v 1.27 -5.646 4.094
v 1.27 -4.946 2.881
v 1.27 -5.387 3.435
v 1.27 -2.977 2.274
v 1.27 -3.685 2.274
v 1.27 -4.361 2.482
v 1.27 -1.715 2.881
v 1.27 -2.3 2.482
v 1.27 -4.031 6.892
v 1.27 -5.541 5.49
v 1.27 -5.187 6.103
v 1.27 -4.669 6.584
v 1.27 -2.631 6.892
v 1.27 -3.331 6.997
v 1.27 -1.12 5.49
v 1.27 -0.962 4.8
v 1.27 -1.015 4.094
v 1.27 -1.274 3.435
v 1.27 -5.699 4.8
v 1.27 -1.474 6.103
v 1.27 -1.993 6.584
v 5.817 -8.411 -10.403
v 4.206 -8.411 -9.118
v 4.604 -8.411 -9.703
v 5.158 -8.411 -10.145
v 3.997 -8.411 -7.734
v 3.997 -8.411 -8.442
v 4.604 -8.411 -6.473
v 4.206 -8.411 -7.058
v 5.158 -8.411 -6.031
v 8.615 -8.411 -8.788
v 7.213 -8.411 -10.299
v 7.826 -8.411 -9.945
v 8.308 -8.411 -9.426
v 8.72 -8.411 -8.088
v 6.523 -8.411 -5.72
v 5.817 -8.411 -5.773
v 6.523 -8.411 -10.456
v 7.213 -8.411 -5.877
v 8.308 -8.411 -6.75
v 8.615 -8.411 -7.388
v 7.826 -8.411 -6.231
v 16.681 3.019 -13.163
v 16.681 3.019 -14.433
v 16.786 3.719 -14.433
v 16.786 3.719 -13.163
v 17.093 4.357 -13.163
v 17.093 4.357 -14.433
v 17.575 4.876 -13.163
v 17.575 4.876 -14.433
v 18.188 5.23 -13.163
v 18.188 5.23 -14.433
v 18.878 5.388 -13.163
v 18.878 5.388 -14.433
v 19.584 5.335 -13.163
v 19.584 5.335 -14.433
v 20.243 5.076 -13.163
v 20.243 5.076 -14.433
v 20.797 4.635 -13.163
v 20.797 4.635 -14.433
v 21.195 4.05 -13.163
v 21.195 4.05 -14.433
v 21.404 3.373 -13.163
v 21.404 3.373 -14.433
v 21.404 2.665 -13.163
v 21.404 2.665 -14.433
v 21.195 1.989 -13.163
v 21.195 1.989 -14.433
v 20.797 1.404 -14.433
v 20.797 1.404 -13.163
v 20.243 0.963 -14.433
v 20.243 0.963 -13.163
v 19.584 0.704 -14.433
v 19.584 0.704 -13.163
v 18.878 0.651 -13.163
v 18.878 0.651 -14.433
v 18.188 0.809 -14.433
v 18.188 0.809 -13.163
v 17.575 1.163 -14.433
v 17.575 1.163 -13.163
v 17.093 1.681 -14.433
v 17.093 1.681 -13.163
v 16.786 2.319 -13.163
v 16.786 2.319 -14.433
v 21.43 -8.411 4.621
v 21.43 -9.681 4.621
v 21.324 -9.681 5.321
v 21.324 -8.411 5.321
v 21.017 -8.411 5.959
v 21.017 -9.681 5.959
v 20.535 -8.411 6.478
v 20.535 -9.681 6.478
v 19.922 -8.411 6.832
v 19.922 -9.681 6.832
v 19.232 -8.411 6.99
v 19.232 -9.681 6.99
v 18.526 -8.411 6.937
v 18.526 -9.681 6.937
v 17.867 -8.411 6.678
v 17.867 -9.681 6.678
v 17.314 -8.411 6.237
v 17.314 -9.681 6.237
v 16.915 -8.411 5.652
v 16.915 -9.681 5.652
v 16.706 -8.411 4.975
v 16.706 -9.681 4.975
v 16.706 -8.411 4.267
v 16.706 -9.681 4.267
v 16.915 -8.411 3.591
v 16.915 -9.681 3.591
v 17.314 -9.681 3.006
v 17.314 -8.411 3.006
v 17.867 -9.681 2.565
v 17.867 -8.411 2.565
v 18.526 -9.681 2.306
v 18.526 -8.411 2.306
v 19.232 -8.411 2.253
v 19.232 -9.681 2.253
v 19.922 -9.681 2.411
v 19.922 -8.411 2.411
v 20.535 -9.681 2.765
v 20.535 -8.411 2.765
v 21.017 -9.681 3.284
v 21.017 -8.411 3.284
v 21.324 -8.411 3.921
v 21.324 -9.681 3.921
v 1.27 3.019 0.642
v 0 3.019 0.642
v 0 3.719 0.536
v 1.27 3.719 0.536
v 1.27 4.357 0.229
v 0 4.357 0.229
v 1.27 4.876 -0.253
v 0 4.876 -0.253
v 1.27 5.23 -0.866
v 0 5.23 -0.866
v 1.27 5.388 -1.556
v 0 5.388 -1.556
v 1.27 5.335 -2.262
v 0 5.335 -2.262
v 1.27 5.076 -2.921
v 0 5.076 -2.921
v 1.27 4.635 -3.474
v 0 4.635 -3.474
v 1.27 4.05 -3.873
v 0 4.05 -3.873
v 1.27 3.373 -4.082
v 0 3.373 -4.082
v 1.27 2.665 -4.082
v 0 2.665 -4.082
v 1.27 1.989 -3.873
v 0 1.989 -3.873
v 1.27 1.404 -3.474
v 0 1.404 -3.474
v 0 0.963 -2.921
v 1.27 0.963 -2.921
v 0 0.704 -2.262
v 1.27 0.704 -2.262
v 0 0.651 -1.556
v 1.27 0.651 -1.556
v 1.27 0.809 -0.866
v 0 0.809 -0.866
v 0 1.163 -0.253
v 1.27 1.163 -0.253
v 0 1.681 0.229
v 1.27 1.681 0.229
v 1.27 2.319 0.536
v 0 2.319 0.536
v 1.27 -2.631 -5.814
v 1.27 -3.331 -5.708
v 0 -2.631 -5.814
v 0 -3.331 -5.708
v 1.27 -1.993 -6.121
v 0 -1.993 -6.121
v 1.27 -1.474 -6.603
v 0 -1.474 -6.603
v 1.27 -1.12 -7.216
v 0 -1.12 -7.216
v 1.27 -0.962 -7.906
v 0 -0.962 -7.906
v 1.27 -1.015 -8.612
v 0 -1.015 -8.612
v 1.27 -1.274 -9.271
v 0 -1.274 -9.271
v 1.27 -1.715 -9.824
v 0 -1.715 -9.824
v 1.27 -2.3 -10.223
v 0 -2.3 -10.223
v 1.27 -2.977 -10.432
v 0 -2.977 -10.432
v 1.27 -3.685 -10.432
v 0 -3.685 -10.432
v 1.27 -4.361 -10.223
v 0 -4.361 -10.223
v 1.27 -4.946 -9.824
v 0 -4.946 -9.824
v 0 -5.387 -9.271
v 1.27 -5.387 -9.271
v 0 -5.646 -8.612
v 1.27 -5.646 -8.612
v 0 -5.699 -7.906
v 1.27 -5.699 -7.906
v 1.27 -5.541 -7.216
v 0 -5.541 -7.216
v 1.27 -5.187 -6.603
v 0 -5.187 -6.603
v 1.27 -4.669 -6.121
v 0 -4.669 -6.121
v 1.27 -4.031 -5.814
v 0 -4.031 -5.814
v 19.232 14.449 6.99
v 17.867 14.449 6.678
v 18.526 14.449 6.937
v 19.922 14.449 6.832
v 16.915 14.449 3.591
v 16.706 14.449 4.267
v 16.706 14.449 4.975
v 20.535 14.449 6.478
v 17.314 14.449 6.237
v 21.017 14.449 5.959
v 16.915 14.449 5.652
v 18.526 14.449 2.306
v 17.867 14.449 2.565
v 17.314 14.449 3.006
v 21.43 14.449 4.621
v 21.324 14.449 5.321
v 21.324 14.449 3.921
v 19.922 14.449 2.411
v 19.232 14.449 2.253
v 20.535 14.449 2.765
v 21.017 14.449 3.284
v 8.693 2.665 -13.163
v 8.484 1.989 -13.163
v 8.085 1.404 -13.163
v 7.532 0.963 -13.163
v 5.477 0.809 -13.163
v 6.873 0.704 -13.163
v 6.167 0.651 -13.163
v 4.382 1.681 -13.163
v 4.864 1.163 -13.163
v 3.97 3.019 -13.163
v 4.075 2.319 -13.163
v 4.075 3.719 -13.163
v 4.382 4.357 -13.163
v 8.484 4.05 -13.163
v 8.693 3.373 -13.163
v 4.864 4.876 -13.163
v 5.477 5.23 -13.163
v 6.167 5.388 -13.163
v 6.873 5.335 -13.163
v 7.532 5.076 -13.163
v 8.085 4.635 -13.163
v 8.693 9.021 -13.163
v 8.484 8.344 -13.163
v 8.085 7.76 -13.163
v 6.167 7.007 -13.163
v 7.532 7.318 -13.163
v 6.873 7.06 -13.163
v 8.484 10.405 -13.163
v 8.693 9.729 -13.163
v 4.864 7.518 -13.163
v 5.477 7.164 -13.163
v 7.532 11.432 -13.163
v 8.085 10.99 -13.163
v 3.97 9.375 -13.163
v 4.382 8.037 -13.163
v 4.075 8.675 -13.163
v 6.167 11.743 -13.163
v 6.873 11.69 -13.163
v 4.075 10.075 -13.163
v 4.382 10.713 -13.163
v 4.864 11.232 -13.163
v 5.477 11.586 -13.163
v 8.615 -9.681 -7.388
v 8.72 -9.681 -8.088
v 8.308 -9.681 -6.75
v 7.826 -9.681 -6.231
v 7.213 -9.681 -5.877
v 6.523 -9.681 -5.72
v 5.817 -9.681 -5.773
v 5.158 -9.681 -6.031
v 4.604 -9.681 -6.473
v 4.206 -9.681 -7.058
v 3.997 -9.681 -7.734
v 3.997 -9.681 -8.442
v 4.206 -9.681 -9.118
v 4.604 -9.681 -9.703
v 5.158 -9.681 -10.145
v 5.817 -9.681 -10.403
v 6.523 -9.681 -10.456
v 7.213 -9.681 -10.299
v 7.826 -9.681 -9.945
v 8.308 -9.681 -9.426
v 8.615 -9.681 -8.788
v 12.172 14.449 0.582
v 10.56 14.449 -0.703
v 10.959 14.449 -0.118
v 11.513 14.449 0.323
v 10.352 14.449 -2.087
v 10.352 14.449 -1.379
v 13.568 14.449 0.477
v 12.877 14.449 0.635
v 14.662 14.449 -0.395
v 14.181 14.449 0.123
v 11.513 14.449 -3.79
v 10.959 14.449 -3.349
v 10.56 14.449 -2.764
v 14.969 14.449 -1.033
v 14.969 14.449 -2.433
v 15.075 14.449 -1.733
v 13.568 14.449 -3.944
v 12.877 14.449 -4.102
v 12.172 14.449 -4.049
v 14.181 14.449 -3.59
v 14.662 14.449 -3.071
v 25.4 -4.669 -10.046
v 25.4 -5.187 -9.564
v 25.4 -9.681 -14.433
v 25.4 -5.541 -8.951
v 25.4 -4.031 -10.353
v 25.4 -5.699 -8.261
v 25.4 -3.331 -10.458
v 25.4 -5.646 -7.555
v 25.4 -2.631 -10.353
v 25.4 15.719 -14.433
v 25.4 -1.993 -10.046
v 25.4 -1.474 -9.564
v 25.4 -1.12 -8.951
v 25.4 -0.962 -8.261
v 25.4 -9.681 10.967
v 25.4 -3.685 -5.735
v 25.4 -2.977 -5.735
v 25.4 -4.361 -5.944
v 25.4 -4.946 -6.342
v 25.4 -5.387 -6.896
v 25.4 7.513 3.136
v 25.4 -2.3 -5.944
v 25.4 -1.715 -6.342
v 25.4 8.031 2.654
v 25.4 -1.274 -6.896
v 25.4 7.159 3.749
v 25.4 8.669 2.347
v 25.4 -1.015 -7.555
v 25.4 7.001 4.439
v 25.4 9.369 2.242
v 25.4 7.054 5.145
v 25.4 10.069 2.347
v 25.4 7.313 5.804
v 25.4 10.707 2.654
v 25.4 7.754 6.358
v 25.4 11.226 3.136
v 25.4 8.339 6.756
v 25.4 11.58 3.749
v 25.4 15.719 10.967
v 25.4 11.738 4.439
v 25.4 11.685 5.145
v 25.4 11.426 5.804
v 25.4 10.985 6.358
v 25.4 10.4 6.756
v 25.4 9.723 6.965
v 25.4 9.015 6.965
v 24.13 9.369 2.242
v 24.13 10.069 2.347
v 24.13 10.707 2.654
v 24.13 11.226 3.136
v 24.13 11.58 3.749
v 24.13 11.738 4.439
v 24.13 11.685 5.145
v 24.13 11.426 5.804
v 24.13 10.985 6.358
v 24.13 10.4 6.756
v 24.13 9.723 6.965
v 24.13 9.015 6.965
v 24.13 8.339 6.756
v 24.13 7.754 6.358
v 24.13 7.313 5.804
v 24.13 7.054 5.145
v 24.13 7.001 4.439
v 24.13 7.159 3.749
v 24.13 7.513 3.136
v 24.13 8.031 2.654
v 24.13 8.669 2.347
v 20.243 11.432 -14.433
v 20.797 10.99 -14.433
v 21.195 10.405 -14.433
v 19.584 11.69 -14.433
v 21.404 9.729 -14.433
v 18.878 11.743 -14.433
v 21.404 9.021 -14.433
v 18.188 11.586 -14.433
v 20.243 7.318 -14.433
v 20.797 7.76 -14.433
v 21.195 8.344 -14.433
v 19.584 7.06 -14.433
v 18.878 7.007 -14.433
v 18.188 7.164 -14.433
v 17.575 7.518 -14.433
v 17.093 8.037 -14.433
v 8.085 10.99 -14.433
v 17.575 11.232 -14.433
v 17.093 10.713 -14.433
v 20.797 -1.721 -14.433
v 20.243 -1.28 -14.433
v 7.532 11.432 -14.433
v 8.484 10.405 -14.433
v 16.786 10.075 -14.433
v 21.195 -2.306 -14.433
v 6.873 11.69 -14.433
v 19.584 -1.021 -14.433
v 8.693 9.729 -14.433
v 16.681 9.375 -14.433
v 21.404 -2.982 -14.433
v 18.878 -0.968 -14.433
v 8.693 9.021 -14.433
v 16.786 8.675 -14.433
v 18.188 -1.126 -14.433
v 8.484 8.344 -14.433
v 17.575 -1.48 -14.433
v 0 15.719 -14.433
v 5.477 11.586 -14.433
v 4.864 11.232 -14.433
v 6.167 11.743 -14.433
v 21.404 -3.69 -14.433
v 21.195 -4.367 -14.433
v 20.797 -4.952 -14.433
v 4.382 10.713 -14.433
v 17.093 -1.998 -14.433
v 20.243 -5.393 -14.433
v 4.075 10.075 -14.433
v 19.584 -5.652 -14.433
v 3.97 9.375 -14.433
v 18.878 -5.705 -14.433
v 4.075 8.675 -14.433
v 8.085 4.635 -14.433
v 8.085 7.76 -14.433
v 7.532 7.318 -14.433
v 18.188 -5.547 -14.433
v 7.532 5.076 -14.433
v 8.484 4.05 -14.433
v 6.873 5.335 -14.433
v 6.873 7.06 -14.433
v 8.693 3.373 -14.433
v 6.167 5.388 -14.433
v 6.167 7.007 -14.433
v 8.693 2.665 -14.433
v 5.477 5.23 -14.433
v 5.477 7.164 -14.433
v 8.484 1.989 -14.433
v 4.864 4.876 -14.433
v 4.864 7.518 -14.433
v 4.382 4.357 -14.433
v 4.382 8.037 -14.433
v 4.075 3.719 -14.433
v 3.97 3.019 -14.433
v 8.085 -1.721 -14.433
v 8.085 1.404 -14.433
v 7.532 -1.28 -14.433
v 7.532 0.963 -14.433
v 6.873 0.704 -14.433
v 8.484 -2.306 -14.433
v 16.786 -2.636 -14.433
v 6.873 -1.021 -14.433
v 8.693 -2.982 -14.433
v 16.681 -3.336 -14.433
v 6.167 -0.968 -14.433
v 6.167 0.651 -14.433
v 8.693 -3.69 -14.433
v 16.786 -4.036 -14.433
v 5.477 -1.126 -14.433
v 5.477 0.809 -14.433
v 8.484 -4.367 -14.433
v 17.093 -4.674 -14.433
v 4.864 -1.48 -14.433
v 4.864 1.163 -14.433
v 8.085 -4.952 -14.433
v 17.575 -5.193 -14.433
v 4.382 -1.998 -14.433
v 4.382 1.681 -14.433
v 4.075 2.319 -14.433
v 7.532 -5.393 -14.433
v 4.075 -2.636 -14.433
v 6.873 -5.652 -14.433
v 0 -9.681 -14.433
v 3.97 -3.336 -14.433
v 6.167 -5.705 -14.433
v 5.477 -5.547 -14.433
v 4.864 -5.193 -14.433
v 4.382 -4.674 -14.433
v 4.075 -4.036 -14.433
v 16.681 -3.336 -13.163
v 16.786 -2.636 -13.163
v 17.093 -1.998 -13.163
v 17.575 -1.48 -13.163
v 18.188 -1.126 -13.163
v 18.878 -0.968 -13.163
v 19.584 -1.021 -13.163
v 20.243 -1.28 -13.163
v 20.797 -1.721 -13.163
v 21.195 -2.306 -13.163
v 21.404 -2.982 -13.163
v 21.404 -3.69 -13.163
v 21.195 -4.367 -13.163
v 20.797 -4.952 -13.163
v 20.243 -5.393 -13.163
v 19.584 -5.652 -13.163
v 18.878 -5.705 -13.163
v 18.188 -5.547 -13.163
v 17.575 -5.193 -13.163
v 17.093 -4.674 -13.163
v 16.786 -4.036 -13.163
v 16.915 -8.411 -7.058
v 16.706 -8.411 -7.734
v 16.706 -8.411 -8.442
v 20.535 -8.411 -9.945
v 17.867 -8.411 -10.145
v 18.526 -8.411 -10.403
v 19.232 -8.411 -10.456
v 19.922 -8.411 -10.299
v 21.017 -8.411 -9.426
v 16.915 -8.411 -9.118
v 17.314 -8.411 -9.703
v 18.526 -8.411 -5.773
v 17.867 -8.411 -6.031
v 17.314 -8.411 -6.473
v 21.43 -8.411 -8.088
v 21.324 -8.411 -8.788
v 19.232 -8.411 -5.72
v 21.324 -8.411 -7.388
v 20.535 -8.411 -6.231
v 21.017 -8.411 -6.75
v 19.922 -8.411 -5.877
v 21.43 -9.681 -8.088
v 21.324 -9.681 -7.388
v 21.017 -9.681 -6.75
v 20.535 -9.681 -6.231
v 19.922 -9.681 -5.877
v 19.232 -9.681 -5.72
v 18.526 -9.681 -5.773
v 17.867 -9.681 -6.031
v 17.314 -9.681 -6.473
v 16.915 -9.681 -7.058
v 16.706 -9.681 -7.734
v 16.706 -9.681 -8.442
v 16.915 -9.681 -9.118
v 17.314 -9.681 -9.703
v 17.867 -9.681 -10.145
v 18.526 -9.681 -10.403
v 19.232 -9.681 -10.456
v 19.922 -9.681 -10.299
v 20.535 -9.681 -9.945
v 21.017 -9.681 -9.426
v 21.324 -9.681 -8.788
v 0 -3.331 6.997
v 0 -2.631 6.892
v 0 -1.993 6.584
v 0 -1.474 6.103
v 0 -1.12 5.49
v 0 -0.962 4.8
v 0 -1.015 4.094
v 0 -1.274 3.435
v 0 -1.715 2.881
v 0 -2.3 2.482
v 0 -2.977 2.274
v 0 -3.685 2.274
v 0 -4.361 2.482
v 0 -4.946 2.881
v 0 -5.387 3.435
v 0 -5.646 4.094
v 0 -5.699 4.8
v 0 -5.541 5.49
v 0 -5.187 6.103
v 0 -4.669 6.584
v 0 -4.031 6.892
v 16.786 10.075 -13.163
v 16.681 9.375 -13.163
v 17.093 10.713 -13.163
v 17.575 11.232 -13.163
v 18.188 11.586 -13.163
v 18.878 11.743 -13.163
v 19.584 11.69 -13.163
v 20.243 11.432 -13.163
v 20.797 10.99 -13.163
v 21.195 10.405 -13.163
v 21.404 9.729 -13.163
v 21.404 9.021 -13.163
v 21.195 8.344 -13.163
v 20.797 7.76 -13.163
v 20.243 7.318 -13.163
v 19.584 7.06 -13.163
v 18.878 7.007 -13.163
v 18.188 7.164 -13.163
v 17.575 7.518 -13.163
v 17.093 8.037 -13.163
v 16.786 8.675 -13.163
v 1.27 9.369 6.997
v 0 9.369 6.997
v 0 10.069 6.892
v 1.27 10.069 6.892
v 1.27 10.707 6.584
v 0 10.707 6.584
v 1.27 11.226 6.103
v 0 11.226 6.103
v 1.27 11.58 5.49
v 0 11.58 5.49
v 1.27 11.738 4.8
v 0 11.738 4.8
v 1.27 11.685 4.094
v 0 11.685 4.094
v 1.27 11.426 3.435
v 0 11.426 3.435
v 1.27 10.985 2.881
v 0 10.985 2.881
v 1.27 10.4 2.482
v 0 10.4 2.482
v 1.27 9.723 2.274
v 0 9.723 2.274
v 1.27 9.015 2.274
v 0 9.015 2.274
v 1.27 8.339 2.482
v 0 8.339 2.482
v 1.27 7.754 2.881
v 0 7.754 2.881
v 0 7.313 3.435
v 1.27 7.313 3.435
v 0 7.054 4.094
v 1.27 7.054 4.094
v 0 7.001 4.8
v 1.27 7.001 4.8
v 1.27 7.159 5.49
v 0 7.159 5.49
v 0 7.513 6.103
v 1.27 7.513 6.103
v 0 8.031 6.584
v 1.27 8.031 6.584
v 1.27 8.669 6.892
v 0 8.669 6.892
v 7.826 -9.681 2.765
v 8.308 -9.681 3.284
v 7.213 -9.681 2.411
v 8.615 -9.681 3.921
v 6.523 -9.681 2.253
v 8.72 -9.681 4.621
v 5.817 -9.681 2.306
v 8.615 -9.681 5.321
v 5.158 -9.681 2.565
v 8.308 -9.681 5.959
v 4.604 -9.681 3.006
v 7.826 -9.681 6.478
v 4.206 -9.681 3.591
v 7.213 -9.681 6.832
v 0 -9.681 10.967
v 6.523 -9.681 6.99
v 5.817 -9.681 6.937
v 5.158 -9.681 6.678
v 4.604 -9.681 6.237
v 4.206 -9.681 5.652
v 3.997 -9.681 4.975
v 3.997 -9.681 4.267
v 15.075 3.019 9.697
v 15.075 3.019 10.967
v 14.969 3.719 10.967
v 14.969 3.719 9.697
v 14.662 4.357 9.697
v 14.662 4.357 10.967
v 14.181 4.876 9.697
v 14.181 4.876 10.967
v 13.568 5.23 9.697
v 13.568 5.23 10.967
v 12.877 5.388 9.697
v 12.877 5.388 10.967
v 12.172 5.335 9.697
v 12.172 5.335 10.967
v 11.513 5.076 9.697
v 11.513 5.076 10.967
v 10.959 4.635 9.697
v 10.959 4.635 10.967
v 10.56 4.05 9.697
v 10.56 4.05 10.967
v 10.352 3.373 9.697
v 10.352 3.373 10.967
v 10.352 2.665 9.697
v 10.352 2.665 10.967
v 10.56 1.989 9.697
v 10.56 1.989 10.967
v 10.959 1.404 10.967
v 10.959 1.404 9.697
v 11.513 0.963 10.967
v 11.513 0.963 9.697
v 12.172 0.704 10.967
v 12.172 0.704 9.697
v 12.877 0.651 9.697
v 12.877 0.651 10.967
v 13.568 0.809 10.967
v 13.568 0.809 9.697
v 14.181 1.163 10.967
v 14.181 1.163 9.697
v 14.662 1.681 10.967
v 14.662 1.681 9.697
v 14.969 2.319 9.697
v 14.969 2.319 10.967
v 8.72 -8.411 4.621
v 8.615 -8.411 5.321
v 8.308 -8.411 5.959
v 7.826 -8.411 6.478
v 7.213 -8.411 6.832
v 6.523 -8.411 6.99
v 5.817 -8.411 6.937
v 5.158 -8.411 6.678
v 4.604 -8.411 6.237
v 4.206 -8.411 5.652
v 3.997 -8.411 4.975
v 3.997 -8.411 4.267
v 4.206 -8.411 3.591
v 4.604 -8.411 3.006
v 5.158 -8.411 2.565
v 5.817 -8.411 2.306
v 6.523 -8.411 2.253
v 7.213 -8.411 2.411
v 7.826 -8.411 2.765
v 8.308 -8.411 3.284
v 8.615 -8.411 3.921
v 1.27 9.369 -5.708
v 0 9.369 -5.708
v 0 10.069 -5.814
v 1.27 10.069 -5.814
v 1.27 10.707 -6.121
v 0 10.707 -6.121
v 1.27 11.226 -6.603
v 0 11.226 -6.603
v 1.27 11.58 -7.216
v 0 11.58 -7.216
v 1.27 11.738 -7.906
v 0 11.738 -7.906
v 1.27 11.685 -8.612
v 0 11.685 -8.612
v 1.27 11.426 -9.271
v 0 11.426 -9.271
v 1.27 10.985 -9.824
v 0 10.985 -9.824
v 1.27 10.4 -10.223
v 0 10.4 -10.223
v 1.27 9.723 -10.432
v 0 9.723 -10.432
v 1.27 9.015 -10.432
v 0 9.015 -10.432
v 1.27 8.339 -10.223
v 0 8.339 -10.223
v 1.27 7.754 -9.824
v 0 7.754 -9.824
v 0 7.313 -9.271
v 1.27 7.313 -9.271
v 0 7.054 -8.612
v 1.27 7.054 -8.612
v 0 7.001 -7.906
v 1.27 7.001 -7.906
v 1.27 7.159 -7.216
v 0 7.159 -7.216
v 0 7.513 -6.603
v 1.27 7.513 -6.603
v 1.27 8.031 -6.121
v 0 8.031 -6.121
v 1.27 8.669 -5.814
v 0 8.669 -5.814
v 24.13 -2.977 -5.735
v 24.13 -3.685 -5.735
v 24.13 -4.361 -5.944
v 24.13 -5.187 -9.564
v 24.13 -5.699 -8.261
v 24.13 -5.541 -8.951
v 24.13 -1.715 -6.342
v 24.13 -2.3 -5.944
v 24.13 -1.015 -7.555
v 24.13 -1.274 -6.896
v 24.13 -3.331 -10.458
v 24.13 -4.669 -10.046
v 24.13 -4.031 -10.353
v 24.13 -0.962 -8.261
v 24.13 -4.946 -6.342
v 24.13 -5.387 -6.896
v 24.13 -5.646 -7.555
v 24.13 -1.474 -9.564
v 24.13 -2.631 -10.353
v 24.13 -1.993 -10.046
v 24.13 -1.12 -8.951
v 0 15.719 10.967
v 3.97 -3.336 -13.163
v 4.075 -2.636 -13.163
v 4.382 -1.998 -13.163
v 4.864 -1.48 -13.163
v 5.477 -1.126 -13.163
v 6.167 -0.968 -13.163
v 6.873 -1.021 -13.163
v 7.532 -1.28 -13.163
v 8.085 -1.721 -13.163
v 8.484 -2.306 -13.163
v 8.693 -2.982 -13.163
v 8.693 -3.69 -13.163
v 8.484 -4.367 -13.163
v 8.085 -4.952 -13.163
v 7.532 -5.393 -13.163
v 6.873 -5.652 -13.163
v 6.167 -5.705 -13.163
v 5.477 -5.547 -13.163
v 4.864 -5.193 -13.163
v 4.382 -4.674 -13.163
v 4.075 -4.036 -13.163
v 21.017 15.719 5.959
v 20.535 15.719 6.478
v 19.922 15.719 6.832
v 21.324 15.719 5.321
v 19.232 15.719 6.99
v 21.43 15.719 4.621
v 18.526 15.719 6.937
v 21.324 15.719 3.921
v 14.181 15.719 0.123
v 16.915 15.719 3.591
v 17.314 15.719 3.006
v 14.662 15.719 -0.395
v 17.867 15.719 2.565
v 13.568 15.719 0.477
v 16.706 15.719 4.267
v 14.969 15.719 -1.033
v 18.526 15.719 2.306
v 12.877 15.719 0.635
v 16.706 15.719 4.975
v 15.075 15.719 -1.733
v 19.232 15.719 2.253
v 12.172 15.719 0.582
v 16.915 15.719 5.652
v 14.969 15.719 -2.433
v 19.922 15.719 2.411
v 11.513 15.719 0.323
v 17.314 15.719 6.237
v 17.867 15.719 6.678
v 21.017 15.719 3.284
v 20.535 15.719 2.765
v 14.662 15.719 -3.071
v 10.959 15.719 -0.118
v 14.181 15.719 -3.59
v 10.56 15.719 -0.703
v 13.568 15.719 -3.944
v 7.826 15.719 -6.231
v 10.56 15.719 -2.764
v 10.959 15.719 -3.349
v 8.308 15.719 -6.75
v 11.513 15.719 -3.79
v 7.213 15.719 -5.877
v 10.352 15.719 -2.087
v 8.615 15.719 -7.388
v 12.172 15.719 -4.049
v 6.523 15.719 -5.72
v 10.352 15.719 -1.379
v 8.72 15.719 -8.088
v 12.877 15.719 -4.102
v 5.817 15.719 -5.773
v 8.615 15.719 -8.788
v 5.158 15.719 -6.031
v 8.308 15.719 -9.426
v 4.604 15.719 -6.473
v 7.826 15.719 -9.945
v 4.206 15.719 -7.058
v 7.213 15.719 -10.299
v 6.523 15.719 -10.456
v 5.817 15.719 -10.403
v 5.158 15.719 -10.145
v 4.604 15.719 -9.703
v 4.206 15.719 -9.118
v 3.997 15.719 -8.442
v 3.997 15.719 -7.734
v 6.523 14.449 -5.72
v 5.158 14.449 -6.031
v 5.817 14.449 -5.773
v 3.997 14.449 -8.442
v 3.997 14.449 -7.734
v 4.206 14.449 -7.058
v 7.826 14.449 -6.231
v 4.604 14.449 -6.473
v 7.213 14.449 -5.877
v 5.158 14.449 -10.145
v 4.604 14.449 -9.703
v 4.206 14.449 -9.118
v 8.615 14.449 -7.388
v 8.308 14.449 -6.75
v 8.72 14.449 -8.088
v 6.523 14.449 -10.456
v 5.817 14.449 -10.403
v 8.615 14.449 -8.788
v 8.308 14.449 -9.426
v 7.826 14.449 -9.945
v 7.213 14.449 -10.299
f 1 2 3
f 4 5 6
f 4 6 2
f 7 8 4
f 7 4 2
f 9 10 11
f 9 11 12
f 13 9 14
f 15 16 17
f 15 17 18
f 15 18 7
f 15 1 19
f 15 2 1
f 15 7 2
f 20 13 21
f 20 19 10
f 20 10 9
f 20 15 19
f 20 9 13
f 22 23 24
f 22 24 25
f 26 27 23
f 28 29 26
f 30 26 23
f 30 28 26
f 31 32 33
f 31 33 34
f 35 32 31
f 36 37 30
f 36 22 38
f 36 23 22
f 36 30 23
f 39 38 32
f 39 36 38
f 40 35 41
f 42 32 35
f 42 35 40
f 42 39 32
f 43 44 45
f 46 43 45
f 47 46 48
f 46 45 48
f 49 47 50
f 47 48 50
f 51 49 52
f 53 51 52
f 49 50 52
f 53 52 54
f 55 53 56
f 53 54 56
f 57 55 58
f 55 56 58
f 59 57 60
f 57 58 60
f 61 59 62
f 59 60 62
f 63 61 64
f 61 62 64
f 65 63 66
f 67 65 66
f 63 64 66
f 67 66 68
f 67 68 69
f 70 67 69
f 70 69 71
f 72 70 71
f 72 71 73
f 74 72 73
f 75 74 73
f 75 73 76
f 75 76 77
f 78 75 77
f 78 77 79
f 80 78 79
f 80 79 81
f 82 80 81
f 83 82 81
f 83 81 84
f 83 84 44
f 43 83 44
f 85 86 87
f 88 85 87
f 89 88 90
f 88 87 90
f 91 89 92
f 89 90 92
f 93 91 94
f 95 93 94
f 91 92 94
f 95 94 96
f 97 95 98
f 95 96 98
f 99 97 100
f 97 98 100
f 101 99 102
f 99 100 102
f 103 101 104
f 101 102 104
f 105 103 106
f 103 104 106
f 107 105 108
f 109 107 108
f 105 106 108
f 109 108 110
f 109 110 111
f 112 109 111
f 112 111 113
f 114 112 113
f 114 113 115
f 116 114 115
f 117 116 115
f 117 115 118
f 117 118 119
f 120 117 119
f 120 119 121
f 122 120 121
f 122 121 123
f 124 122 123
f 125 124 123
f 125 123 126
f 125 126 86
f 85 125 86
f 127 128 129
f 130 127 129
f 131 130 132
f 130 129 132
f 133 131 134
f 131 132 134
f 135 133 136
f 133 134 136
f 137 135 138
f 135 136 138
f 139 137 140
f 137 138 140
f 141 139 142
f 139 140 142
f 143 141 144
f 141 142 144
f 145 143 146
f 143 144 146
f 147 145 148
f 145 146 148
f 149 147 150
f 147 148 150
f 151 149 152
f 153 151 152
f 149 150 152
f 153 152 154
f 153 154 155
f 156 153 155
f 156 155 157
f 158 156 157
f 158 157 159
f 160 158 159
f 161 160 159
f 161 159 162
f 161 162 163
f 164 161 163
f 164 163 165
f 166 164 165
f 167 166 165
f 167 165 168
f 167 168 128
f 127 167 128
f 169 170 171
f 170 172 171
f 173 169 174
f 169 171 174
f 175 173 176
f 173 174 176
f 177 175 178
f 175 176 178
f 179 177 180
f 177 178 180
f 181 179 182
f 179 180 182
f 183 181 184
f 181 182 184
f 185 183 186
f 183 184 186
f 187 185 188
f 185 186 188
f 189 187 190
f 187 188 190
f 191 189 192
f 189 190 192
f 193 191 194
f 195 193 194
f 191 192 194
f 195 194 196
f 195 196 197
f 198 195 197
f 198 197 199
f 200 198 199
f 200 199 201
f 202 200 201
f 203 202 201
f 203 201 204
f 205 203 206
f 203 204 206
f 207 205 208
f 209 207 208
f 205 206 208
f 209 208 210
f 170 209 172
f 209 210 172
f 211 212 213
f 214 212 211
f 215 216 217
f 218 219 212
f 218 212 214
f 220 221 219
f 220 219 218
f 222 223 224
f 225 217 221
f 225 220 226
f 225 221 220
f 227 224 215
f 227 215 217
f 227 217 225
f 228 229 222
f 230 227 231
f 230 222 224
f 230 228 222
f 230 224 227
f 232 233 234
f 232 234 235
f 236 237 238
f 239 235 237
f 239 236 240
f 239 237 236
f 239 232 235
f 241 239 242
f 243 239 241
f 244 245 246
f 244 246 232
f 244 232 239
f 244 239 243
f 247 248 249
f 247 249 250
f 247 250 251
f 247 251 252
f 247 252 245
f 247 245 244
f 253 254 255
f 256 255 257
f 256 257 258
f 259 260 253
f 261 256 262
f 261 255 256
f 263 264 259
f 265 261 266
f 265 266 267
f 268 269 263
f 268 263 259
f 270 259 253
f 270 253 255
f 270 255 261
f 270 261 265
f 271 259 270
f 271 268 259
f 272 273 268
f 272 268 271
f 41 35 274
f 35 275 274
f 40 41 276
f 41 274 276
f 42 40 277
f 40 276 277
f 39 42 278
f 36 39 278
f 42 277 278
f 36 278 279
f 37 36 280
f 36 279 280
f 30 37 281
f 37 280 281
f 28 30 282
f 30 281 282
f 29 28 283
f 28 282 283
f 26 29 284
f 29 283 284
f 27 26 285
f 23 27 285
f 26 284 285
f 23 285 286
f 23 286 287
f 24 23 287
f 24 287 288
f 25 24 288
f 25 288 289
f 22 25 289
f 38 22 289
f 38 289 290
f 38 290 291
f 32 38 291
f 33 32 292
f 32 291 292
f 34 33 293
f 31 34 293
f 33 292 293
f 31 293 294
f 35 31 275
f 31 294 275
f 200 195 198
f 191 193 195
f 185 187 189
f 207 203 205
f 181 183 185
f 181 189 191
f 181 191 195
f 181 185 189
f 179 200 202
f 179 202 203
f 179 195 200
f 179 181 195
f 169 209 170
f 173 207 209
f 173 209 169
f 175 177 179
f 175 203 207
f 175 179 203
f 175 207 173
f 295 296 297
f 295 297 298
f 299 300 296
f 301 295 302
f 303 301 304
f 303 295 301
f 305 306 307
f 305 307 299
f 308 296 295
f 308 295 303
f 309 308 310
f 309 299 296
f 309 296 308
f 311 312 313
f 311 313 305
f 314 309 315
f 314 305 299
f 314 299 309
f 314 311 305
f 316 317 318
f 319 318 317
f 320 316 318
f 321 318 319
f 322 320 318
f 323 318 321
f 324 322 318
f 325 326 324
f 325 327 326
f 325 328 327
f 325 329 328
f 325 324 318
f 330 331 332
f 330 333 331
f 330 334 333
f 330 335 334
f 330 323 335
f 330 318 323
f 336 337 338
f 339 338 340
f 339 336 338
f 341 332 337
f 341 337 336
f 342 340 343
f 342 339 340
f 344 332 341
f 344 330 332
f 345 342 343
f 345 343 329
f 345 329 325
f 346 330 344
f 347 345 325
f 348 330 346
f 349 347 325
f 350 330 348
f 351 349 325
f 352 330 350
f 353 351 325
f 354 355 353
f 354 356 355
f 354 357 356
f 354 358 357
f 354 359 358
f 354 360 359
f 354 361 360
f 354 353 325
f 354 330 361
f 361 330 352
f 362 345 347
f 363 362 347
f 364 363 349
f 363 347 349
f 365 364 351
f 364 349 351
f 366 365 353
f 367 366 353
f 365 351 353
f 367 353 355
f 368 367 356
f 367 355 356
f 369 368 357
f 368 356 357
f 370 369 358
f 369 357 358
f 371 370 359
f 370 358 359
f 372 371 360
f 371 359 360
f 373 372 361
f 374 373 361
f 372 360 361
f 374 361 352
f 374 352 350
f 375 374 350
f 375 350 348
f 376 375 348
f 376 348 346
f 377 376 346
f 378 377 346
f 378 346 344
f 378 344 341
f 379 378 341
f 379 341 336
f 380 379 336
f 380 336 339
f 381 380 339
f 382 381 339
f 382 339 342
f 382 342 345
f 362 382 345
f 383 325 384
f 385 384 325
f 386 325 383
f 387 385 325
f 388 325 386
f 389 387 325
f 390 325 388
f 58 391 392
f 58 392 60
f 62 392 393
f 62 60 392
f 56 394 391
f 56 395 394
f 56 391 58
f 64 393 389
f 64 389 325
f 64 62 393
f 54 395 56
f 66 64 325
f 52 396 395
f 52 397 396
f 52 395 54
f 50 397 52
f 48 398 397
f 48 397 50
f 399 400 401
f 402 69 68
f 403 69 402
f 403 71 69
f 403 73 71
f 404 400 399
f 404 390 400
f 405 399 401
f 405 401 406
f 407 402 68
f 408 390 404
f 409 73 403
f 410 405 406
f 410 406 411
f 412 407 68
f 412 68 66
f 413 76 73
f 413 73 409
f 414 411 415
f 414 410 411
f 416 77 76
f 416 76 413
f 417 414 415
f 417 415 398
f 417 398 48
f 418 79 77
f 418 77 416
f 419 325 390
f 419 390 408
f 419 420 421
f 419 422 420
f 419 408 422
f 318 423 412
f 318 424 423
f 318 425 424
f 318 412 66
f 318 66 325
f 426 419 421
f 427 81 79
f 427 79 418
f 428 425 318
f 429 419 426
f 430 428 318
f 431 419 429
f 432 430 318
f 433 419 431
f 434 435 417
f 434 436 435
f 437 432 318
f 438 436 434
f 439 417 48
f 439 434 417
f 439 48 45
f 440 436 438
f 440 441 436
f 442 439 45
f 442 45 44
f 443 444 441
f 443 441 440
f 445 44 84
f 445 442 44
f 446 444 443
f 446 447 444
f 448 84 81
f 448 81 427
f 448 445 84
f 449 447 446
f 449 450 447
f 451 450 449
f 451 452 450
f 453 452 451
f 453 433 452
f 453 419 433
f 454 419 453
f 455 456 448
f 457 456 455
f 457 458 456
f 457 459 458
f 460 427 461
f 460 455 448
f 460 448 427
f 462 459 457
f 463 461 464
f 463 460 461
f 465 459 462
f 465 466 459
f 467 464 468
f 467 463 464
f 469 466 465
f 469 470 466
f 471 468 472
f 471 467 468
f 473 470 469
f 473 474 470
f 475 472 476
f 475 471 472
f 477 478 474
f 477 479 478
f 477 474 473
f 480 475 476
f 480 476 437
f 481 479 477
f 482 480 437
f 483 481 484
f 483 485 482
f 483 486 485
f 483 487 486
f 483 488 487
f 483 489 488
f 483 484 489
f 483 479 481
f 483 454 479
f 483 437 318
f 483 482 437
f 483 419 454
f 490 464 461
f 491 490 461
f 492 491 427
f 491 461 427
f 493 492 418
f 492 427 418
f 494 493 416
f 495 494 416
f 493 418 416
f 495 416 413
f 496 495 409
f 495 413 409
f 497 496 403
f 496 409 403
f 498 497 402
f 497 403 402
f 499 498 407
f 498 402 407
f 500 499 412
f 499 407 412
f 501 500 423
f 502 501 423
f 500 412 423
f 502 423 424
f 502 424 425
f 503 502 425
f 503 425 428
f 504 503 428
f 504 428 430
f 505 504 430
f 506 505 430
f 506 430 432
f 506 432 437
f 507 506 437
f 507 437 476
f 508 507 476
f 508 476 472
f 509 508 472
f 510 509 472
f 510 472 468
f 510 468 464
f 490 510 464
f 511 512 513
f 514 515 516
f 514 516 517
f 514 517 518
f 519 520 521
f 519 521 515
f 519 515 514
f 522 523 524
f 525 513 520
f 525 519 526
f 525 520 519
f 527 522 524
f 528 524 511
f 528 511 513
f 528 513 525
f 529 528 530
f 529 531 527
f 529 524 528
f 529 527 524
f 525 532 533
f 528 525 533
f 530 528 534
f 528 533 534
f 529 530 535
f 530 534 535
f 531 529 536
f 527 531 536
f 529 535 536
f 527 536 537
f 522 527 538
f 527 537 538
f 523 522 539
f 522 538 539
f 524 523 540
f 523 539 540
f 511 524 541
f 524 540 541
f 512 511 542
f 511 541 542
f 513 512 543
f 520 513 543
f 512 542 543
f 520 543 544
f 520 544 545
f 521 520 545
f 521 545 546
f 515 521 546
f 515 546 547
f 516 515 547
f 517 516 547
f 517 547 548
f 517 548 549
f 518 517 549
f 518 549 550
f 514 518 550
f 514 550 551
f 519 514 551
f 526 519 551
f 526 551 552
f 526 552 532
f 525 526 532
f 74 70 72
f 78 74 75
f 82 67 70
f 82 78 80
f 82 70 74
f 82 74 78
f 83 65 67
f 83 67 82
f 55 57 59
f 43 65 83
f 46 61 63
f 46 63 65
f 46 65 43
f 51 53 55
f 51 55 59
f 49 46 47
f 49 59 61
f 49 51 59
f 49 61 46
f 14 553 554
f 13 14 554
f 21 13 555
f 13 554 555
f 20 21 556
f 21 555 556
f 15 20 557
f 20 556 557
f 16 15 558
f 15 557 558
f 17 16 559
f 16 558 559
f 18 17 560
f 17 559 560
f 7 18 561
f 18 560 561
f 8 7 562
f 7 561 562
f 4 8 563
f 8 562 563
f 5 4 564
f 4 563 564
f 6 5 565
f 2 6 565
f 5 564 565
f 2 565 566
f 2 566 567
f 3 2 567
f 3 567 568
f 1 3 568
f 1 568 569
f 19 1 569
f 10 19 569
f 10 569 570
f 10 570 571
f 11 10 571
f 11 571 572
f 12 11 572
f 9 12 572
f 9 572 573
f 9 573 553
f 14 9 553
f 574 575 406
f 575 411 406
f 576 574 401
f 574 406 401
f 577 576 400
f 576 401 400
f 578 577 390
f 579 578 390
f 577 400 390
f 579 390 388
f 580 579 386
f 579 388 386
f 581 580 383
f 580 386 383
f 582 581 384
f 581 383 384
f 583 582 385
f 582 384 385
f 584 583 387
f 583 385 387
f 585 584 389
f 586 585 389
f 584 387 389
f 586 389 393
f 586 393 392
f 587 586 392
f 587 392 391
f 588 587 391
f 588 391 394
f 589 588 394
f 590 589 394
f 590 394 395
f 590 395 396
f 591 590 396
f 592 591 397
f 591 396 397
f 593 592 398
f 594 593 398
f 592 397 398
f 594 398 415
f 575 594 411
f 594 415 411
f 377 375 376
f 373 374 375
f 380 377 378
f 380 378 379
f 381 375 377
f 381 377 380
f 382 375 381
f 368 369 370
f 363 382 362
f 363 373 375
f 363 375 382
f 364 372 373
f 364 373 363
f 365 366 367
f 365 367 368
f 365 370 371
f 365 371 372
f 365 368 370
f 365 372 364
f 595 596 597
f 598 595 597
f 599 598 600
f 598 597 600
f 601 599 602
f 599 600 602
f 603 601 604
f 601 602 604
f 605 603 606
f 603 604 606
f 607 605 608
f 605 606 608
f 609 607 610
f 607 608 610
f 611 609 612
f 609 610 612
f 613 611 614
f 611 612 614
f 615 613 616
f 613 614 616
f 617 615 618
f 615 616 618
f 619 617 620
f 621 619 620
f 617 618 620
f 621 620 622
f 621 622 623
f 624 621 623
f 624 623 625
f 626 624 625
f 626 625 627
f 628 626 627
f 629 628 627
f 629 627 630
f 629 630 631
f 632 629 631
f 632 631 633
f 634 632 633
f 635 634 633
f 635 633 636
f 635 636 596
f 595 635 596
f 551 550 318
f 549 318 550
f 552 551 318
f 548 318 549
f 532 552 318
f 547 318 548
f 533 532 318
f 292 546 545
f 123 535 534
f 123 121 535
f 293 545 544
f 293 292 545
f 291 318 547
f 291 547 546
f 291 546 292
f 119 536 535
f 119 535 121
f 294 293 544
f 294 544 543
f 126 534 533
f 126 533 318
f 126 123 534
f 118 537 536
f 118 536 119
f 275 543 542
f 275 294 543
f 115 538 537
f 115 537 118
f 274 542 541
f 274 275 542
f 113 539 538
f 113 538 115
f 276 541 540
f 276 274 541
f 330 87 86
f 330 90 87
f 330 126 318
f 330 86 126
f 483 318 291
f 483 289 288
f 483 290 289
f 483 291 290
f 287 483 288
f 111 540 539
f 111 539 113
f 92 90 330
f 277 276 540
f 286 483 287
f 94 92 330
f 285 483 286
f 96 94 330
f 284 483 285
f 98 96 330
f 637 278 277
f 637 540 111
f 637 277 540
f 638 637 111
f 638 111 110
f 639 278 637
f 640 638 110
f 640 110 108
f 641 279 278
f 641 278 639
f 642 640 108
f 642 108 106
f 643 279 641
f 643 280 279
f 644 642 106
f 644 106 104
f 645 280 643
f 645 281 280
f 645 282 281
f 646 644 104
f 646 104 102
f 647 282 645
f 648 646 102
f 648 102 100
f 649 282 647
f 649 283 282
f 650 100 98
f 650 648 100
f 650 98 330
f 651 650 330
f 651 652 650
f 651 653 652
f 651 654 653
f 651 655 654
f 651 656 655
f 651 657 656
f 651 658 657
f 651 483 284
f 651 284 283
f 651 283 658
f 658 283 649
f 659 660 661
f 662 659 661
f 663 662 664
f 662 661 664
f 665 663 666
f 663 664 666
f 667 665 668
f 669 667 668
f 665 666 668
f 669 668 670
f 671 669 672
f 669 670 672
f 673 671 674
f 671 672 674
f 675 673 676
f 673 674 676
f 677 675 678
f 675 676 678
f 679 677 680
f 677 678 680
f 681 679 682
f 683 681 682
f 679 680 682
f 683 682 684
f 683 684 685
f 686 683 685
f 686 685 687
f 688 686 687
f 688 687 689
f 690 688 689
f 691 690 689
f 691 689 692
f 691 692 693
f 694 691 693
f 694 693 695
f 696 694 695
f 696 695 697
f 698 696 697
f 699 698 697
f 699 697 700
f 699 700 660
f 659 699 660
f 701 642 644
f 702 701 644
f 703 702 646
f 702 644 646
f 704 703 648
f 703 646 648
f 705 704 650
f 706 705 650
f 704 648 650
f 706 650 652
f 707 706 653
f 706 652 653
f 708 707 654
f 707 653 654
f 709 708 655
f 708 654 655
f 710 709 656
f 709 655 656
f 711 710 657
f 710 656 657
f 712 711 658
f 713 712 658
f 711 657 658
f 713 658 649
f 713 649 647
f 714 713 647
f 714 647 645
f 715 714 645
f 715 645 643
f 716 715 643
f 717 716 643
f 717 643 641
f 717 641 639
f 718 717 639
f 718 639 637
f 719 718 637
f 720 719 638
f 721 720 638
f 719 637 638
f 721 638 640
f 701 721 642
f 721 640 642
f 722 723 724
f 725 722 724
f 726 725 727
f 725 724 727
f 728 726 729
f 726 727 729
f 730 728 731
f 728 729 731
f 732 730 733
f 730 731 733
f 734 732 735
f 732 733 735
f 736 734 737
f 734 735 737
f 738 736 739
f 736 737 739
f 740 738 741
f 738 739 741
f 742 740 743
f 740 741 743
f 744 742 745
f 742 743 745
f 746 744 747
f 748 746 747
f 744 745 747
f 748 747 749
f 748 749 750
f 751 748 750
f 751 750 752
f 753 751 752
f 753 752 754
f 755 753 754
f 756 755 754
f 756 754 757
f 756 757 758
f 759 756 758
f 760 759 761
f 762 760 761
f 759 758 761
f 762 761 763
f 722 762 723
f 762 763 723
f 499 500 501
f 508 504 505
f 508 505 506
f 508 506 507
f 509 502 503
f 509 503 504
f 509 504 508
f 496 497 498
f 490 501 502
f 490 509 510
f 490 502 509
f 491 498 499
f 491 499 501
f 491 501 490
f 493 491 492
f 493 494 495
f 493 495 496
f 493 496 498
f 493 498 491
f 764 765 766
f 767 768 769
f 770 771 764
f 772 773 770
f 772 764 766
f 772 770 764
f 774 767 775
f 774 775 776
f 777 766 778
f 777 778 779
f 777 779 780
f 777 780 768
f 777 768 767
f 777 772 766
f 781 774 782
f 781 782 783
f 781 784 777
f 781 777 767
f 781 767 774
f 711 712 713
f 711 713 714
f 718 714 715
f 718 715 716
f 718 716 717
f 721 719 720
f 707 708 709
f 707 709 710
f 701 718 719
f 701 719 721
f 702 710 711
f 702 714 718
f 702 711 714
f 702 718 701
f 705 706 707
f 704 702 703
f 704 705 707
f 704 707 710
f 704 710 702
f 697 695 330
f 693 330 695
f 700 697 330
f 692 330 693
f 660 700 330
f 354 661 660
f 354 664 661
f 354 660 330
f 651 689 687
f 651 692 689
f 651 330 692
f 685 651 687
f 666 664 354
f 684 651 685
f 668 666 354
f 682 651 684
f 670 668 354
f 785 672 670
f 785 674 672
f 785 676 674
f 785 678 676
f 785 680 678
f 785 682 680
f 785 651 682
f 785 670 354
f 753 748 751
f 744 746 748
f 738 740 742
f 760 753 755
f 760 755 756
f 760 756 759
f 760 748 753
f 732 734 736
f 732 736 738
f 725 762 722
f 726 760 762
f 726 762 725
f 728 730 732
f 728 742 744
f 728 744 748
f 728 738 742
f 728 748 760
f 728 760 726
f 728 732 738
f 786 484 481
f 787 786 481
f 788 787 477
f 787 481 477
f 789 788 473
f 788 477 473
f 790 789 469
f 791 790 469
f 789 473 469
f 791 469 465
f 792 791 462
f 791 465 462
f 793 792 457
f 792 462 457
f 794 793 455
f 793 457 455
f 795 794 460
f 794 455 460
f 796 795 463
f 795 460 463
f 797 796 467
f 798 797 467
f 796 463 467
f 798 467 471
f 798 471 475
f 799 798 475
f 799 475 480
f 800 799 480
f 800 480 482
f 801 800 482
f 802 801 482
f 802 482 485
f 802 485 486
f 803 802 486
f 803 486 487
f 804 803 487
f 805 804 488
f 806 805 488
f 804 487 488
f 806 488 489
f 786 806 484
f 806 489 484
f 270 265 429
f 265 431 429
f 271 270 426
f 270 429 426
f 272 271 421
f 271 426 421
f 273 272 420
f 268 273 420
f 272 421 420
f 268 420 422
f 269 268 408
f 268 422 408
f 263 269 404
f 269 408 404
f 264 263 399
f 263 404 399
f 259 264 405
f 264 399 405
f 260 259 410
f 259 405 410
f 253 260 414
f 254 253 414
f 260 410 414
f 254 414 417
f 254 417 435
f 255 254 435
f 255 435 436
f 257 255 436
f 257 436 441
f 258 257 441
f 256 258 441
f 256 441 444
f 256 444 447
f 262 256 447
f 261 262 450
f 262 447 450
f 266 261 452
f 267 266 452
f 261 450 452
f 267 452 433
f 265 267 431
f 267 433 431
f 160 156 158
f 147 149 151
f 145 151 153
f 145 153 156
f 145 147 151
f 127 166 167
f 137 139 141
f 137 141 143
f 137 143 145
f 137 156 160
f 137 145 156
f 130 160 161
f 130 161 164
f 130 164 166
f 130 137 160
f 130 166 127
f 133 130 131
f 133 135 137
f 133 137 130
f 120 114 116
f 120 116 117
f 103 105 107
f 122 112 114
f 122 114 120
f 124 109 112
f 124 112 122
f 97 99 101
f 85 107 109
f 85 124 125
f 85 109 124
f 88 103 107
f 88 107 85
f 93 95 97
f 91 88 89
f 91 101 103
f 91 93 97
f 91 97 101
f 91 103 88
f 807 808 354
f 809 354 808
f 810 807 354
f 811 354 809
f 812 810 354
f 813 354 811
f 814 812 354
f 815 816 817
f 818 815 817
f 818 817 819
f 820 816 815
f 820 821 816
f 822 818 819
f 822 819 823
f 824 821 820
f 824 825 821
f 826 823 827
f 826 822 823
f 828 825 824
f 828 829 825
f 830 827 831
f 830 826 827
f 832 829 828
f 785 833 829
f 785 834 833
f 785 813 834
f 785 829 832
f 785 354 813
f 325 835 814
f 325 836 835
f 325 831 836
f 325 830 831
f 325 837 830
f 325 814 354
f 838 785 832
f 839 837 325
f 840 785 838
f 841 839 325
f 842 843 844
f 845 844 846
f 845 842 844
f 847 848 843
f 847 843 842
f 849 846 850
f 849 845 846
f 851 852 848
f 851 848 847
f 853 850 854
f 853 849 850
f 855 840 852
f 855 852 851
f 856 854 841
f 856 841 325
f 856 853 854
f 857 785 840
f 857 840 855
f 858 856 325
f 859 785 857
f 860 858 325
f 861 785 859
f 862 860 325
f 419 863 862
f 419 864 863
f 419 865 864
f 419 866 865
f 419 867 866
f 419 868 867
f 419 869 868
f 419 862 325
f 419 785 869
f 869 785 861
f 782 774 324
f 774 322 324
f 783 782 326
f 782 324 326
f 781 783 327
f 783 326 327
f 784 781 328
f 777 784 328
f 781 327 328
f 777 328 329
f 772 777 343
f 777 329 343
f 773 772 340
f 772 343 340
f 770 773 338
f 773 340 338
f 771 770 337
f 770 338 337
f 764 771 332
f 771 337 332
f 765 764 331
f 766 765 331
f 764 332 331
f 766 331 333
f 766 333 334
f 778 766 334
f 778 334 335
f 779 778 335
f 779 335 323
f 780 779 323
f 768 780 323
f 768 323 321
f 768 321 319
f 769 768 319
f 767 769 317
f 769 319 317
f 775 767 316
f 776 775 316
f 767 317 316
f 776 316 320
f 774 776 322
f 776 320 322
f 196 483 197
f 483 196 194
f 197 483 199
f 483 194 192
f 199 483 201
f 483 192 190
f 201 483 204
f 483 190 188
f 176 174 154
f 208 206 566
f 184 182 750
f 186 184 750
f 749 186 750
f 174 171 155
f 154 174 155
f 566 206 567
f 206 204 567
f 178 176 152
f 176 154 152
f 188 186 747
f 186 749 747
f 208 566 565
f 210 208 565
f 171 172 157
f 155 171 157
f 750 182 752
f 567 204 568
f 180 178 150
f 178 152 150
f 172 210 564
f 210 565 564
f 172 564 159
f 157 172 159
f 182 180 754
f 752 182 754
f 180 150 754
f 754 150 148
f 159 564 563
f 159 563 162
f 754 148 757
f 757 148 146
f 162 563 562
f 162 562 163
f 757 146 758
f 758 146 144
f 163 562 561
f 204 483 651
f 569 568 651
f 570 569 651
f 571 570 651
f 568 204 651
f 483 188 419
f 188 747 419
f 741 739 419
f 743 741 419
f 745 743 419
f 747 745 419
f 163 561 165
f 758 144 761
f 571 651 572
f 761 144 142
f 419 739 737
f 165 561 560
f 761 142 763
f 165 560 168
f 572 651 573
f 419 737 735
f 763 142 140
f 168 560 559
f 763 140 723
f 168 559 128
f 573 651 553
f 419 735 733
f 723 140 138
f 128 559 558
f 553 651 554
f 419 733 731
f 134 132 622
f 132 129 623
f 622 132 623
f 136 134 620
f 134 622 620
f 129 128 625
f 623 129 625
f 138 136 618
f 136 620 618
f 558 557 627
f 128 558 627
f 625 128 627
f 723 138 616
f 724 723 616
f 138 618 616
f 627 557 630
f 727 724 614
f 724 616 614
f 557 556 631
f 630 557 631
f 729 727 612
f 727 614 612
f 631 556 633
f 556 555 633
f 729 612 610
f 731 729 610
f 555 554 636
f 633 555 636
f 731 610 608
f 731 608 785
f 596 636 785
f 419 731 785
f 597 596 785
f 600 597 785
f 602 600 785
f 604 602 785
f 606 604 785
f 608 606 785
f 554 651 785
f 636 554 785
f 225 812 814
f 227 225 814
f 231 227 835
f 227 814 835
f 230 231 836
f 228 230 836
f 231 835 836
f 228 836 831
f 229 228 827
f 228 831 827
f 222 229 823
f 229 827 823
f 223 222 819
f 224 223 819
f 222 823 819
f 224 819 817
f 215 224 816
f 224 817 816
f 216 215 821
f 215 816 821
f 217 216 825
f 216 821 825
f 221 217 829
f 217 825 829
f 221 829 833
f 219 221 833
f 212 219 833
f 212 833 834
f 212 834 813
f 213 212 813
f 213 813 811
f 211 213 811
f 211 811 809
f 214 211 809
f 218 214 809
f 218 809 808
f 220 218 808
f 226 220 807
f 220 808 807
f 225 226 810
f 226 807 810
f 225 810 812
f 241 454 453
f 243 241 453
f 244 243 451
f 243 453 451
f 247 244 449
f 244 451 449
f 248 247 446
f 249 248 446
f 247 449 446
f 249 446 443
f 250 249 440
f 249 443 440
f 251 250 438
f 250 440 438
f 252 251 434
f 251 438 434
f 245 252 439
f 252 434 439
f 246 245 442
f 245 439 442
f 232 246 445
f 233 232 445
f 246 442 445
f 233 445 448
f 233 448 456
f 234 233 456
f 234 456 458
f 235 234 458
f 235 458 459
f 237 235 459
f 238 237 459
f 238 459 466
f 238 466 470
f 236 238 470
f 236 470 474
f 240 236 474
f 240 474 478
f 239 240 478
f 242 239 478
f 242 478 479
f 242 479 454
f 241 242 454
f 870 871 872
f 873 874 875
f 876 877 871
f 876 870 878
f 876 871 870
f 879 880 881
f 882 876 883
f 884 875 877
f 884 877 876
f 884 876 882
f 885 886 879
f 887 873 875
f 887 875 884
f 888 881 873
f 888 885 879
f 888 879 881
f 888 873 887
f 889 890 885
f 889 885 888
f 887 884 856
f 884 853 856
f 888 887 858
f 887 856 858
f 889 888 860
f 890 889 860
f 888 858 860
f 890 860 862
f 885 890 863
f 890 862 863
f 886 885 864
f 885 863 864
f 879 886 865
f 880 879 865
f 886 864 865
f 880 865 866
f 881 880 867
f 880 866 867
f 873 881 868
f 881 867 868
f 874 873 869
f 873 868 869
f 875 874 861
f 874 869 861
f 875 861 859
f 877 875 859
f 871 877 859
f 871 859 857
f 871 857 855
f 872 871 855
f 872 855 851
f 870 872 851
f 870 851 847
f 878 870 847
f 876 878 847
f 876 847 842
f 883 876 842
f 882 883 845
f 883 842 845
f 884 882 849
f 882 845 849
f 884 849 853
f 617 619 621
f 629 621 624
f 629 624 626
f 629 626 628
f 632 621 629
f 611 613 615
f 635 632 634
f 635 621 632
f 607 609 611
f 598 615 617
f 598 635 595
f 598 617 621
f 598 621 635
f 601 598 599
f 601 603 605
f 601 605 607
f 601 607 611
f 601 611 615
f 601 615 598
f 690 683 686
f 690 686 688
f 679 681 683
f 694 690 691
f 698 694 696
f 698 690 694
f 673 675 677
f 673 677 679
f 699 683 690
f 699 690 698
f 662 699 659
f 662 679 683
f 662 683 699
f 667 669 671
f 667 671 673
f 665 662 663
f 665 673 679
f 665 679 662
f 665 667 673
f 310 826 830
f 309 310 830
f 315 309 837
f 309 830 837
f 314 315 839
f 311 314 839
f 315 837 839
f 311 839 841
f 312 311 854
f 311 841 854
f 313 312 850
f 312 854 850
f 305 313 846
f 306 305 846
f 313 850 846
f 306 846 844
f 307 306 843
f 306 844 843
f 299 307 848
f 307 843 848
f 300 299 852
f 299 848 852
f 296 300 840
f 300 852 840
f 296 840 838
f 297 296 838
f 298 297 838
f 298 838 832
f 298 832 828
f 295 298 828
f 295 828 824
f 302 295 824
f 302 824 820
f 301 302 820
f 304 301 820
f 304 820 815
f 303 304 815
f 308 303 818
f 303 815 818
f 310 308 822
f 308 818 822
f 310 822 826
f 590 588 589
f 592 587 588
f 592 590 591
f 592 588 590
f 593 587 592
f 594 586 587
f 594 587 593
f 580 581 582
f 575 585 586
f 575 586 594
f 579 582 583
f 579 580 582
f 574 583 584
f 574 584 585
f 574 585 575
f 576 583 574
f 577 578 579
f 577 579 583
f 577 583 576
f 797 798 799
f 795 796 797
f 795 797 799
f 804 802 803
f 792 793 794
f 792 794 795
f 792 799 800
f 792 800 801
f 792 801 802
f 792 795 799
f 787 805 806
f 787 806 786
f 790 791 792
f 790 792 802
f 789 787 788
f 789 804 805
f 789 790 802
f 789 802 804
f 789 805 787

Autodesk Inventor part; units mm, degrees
ref_plane "YZ Plane" through (0, 0, 0) normal (1, 0, 0) x (0, 1, 0)
ref_plane "XZ Plane" through (0, 0, 0) normal (0, 1, 0) x (-1, 0, 0)
ref_plane "XY Plane" through (0, 0, 0) normal (0, 0, 1) x (1, 0, 0)
sketch "Sketch1" plane through (0, 0, 0) normal (1, 0, 0) x (0, 1, 0)
  line L0 (15.7193, -14.4333) -> (-9.6807, -14.4333)
  line L1 (-9.6807, -14.4333) -> (-9.6807, 10.9667)
  line L2 (-9.6807, 10.9667) -> (15.7193, 10.9667)
  line L3 (15.7193, 10.9667) -> (15.7193, -14.4333)
  line L4 (15.7193, -14.4333) -> (-9.6807, 10.9667) construction
  line L5 (-9.6807, -14.4333) -> (15.7193, 10.9667) construction
  point P0 (0, 0)
  point P1 (3.0193, -1.7333)
  dimension "d0" = 25.4
  dimension "d1" = 25.4
extrude "Extrusion1" add sketch "Sketch1" along normal blind 25.4
sketch "Sketch2" plane through (0, -9.6807, 10.9667) normal (0, 0, 1) x (1, 0, 0)
  circle A0 centre (12.7, 12.7) radius 2.3749
  point P0 (0, 9.6807)
  dimension "d4" = 4.7498
sketch "Sketch3" plane through (0, -9.6807, 10.9667) normal (0, 0, 1) x (1, 0, 0)
  line L0 (0, 0) -> (0, 25.4) projected
  line L1 (0, 0) -> (25.4, 0) projected
  line L2 (25.4, 25.4) -> (25.4, 0) projected
  line L3 (0, 25.4) -> (25.4, 25.4) projected
  point P0 (0, 9.6807)
extrude "Extrusion2" cut sketch "Sketch2" against normal blind 1.27
sketch "Sketch4" plane through (0, 15.7193, 10.9667) normal (0, 1, 0) x (1, 0, 0)
  circle A0 centre (6.3453, 19.0547) radius 2.3749
  circle A1 centre (12.7, 12.7) radius 2.3749
  circle A2 centre (19.0547, 6.3453) radius 2.3749
  point P0 (0, 10.9667)
  dimension "d7" = 4.7498
  dimension "d8" = 4.7498
  dimension "d9" = 4.7498
extrude "Extrusion3" cut sketch "Sketch4" against normal blind 1.27
sketch "Sketch5" plane through (0, -9.6807, -14.4333) normal (0, -1, 0) x (1, 0, 0)
  circle A0 centre (6.3453, 19.0547) radius 2.3749
  circle A1 centre (19.0547, 19.0547) radius 2.3749
  circle A2 centre (6.3453, 6.3453) radius 2.3749
  circle A3 centre (19.0547, 6.3453) radius 2.3749
  point P0 (0, 14.4333)
  dimension "d12" = 4.7498
  dimension "d13" = 4.7498
  dimension "d14" = 4.7498
  dimension "d15" = 4.7498
extrude "Extrusion4" cut sketch "Sketch5" against normal blind 1.27
sketch "Sketch6" plane through (0, -9.6807, -14.4333) normal (0, 0, -1) x (-1, 0, 0)
  circle A0 centre (-19.0556, 19.0556) radius 2.3749
  circle A1 centre (-6.3444, 19.0556) radius 2.3749
  circle A2 centre (-6.3444, 6.3444) radius 2.3749
  circle A3 centre (-19.0556, 6.3444) radius 2.3749
  circle A4 centre (-6.3444, 12.7) radius 2.3749
  circle A5 centre (-19.0556, 12.7) radius 2.3749
  point P0 (0, 9.6807)
  dimension "d18" = 4.7498
  dimension "d19" = 4.7498
  dimension "d20" = 4.7498
  dimension "d21" = 4.7498
  dimension "d22" = 4.7498
  dimension "d23" = 4.7498
extrude "Extrusion5" cut sketch "Sketch6" against normal blind 1.27
sketch "Sketch7" plane through (0, 0, 0) normal (-1, 0, 0) x (0, 0, 1)
  line L0 (-14.4333, 15.7193) -> (-14.4333, -9.6807) projected
  line L1 (-14.4333, -9.6807) -> (10.9667, -9.6807) projected
  line L2 (10.9667, -9.6807) -> (10.9667, 15.7193) projected
  line L3 (10.9667, 15.7193) -> (-14.4333, 15.7193) projected
  circle A0 centre (-8.0833, 9.3693) radius 2.3749
  circle A1 centre (4.6222, 9.3693) radius 2.3749
  circle A2 centre (4.6222, -3.3307) radius 2.3749
  circle A3 centre (-8.0833, -3.3307) radius 2.3749
  circle A4 centre (-1.7333, 3.0193) radius 2.3749
  point P0 (0, 0)
  dimension "d26" = 6.35
  dimension "d27" = 6.35
  dimension "d28" = 6.35
  dimension "d29" = 6.3444
  dimension "d30" = 6.35
  dimension "d31" = 6.3444
  dimension "d32" = 6.35
  dimension "d33" = 6.35
  dimension "d34" = 12.7
  dimension "d35" = 12.7
  dimension "d36" = 4.7498
  dimension "d37" = 4.7498
  dimension "d38" = 4.7498
  dimension "d39" = 4.7498
  dimension "d40" = 4.7498
extrude "Extrusion6" cut sketch "Sketch7" against normal blind 1.27 contours A0 | A1 | A2 | A3 | A4
sketch "Sketch8" plane through (25.4, 0, 0) normal (1, 0, 0) x (0, 0, -1)
  line L0 (14.4333, -9.6807) -> (14.4333, 15.7193) projected
  line L1 (14.4333, 15.7193) -> (-10.9667, 15.7193) projected
  line L2 (-10.9667, 15.7193) -> (-10.9667, -9.6807) projected
  line L3 (-10.9667, -9.6807) -> (14.4333, -9.6807) projected
  circle A0 centre (-4.6167, 9.3693) radius 2.3749
  circle A1 centre (8.0833, -3.3307) radius 2.3749
  point P0 (0, 0)
  dimension "d43" = 4.7498
  dimension "d44" = 4.7498
  dimension "d45" = 6.35
  dimension "d46" = 6.35
  dimension "d47" = 6.35
  dimension "d48" = 6.35
extrude "Extrusion7" cut sketch "Sketch8" against normal blind 1.27 contours A0 | A1
